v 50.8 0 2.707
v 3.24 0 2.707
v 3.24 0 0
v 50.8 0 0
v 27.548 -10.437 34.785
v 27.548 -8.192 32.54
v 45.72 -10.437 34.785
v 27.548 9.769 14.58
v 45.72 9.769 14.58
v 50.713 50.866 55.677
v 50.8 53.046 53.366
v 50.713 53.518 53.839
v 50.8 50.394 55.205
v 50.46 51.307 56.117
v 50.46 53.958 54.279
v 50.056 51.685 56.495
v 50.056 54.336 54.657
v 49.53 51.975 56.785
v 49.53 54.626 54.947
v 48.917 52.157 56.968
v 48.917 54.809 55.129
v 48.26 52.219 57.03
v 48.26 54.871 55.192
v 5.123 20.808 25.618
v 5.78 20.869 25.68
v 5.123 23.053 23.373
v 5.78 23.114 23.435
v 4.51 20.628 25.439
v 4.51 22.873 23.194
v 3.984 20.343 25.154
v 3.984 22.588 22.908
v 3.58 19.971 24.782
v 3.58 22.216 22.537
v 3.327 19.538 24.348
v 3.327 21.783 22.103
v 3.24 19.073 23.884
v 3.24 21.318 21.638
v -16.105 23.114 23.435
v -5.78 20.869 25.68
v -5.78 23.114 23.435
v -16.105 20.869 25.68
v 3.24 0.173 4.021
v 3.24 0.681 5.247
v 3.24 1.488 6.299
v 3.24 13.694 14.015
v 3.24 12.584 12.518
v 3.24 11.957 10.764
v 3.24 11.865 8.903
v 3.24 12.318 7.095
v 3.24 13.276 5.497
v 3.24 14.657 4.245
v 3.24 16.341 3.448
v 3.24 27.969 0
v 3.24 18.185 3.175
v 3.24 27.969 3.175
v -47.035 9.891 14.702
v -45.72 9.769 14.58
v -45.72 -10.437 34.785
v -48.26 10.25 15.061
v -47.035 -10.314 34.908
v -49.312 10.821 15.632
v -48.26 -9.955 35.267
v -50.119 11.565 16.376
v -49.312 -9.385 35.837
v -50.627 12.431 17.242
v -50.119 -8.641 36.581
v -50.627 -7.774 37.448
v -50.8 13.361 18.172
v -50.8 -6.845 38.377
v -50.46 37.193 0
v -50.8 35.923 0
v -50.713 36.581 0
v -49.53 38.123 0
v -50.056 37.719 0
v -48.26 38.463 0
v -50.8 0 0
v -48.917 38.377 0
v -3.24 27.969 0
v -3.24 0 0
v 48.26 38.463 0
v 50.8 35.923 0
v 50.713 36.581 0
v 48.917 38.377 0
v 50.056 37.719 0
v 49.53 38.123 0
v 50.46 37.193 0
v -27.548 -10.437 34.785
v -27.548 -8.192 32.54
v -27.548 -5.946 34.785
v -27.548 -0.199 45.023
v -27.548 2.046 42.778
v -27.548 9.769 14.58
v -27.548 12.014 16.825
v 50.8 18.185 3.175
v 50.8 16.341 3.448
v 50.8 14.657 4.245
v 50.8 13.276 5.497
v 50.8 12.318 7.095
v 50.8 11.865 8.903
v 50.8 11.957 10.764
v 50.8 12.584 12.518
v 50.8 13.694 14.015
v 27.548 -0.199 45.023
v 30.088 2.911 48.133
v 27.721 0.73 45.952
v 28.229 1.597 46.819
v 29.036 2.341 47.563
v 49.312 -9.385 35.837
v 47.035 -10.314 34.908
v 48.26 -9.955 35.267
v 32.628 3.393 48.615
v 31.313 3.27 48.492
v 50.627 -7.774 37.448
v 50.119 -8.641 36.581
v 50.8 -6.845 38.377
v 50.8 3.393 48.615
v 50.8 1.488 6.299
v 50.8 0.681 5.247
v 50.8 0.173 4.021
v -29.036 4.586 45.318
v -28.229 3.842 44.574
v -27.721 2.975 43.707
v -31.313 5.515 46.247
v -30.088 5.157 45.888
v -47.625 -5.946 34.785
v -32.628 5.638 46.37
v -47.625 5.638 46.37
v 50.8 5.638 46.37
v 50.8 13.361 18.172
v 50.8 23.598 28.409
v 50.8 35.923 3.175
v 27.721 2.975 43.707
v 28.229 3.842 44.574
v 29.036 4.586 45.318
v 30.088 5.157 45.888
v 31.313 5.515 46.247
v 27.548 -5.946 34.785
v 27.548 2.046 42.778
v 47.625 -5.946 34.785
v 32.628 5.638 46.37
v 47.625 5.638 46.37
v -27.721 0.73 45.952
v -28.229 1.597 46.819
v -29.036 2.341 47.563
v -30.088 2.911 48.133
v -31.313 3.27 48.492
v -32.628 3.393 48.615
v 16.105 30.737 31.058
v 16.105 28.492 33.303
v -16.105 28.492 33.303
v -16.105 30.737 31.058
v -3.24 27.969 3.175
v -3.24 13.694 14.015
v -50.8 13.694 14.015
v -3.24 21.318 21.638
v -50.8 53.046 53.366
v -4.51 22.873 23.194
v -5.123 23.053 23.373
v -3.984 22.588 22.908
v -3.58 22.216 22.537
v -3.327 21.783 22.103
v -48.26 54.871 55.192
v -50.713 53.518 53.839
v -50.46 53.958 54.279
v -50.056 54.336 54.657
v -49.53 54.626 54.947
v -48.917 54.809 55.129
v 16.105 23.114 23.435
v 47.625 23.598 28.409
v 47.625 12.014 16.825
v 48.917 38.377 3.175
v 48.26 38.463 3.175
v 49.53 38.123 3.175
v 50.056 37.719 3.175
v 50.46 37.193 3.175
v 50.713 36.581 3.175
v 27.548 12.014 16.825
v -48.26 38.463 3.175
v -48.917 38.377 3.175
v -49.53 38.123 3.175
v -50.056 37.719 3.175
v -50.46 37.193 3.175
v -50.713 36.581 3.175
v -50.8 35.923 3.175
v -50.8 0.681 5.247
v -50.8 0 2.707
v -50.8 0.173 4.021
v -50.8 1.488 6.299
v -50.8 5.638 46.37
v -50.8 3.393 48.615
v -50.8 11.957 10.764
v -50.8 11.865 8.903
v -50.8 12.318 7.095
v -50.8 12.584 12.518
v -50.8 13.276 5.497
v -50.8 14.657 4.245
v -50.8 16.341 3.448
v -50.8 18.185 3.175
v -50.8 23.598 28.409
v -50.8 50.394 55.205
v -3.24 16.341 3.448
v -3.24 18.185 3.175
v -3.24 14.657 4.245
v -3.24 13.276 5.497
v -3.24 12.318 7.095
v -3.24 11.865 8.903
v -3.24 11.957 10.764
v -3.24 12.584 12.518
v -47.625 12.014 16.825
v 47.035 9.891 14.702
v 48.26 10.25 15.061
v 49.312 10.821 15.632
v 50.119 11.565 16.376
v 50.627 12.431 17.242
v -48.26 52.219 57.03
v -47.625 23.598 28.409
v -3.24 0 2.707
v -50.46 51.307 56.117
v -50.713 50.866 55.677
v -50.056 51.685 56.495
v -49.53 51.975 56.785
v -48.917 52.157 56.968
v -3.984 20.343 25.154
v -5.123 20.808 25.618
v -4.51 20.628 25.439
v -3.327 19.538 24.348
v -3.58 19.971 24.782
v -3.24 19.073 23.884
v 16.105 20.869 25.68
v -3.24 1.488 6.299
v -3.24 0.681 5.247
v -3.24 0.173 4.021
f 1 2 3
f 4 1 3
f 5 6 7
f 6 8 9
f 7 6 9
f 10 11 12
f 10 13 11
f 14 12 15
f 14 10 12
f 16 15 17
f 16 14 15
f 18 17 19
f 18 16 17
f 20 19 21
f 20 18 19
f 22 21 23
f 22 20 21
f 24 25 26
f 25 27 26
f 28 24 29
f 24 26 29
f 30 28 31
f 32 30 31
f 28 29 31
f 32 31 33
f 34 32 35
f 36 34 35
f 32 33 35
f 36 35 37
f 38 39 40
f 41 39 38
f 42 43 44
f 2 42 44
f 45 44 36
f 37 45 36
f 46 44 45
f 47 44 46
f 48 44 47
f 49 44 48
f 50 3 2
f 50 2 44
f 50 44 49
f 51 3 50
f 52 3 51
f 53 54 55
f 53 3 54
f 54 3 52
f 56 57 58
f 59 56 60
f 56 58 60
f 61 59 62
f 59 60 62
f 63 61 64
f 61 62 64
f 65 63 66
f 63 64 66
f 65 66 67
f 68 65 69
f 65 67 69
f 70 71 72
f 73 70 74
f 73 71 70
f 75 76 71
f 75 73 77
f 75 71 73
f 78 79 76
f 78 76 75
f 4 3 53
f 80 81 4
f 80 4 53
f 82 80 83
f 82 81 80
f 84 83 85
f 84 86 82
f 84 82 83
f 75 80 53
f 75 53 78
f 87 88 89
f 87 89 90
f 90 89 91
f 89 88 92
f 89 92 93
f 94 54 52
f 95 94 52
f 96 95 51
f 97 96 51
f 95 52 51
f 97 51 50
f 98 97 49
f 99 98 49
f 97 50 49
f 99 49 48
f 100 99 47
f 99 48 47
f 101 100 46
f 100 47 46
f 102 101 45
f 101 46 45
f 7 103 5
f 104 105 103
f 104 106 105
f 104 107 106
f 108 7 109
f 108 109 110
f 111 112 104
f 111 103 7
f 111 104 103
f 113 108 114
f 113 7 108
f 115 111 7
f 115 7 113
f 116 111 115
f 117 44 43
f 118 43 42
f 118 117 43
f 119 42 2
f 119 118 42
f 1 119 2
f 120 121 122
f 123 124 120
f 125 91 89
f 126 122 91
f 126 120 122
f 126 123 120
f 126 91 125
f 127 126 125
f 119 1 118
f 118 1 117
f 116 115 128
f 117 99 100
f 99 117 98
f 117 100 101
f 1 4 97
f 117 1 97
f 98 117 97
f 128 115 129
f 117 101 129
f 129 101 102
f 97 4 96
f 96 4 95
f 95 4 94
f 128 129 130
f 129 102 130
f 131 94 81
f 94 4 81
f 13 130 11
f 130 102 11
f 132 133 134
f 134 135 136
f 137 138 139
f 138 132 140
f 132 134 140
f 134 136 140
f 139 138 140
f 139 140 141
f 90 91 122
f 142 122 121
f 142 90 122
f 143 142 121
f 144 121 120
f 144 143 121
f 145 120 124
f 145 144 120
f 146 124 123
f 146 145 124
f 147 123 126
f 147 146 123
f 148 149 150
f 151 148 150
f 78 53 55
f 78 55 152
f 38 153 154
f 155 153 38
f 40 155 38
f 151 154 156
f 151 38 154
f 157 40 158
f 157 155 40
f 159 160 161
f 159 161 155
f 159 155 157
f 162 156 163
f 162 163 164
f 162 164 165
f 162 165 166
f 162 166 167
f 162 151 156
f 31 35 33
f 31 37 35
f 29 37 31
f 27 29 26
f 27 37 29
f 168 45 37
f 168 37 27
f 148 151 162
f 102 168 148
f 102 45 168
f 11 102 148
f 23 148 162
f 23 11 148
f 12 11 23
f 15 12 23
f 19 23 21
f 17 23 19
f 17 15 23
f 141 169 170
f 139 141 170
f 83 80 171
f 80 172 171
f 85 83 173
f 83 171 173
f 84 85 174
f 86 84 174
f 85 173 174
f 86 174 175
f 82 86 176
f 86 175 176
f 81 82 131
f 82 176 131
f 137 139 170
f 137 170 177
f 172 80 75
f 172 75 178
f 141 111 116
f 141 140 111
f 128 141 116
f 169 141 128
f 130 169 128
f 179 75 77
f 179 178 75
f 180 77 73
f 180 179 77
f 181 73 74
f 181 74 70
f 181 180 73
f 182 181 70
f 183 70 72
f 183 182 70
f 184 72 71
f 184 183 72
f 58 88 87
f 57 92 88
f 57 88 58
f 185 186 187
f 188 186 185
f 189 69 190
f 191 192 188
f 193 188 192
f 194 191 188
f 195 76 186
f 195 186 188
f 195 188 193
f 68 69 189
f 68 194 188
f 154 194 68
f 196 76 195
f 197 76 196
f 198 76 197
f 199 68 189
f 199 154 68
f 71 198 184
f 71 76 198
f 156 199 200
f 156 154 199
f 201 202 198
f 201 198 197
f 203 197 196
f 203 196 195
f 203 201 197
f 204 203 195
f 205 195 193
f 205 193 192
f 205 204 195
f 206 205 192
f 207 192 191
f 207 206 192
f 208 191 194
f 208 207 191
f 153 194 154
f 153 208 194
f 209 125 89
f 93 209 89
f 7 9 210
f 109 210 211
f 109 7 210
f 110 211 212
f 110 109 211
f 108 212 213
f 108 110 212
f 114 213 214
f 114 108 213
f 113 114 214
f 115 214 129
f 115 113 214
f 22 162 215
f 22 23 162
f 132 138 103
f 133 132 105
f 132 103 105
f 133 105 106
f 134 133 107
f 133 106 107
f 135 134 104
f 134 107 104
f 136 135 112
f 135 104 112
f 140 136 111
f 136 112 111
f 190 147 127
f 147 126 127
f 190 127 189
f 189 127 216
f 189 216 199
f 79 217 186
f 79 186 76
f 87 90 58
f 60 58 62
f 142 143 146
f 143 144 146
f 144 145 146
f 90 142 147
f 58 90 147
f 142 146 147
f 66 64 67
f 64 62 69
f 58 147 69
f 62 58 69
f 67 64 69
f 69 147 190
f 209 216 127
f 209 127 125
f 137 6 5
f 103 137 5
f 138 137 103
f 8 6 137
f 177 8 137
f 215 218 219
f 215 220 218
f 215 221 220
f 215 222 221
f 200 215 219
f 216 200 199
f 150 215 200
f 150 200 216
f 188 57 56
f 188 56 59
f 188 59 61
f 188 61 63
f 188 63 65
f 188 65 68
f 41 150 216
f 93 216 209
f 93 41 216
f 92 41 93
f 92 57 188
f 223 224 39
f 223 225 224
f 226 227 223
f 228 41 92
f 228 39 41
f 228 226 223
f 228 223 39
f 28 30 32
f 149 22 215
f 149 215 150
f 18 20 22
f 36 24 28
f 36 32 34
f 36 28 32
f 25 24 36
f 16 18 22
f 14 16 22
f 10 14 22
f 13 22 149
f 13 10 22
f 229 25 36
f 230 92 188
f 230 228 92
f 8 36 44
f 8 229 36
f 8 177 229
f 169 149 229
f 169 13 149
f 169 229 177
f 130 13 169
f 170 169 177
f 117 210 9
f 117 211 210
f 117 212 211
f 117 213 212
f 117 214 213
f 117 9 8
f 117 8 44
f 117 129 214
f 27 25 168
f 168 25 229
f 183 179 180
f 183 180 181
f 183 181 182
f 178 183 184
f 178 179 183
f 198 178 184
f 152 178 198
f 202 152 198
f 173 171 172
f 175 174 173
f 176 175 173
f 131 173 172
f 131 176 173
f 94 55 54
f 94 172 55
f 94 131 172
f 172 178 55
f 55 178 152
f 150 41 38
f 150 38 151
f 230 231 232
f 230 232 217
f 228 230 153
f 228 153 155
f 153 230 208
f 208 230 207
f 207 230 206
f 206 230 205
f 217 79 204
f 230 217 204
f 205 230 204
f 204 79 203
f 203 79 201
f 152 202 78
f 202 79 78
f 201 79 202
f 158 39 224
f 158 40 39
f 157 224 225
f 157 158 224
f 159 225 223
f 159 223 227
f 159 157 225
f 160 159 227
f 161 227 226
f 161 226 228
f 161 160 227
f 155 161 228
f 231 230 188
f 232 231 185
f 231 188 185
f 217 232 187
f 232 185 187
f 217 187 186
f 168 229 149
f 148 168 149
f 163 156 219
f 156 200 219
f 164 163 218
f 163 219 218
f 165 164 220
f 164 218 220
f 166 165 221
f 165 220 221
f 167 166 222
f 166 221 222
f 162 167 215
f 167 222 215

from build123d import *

# Parameters (mm, degrees)
F1_DEPTH = 50.8
F3_DEPTH = 25.4
F4_W     = 16.1045007408
F4_H     = 10.7811614871
F5_DEPTH = 3.175
F6_W     = 3.2399867196
F6_H     = 27.9691088945
F7_REACH = 85.1871733106
F8_W     = 23.2520068914
F8_H     = 19.5576284379
F9_DEPTH = 3.175
F10_R    = 5.08
F11_R    = 2.54


with BuildPart() as f1:
    # F0 (on Right) → F1 (new body)
    with BuildSketch(Plane.YZ):
        with BuildLine():
            Line((0, 0), (38.4632237256, 0))
            Line((38.4632237256, 0), (38.4632237256, 3.175))
            Line((38.4632237256, 3.175), (18.1845425574, 3.175))
            ThreePointArc((18.1845425574, 3.175), (12.3179075259, 7.0949602045), (13.6944144968, 14.0151280605))
            Line((13.6944144968, 14.0151280605), (54.8708899793, 55.191603543))
            Line((54.8708899793, 55.191603543), (52.2191855315, 57.0300271557))
            Line((52.2191855315, 57.0300271557), (0, 4.8108416242))
            Line((0, 4.8108416242), (0, 0))
        make_face()
    extrude(amount=F1_DEPTH)

    # F2 (on face) → F3 (join)
    with BuildSketch(Plane(origin=(0, -2.4054208121, 2.4054208121), x_dir=(1, 0, 0), z_dir=(0, -0.7071067812, 0.7071067812))):
        Polygon((27.5479931086, 17.2171894163), (50.8, 17.2171894163), (50.8, 36.7748178542), (47.625, 36.7748178542), (47.625, 20.3921894163), (27.5479931086, 20.3921894163), align=None)
    extrude(amount=F3_DEPTH)

    # F4 (on face) → F5 (cut, through all)
    with BuildSketch(Plane(origin=(0, -2.4054208121, 2.4054208121), x_dir=(1, 0, 0), z_dir=(0, -0.7071067812, 0.7071067812))):
        with Locations((8.0522503704, 38.3052378893)):
            Rectangle(F4_W, F4_H)
    extrude(amount=-F5_DEPTH, mode=Mode.SUBTRACT)

    f7_end = Plane(origin=(8.0522503704, 21.9912884712, 24.5570660652), x_dir=(0, 0.7071067812, -0.7071067812), z_dir=(0, 0.7071067812, 0.7071067812))
    # F6 (on Top) → F7 (cut, up to a plane its end follows)
    with BuildSketch(Plane.XY):
        with Locations((1.6199933598, 13.9845544472)):
            Rectangle(F6_W, F6_H)
    f7_long = extrude(amount=F7_REACH, mode=Mode.PRIVATE)
    add(split(f7_long, bisect_by=f7_end, keep=Keep.BOTTOM, mode=Mode.PRIVATE), mode=Mode.SUBTRACT)

    # F8 (on face) → F9 (join)
    with BuildSketch(Plane(origin=(0, -20.3659330543, 20.3659330543), x_dir=(1, 0, 0), z_dir=(0, -0.7071067812, 0.7071067812))):
        with Locations((39.1739965543, 26.9960036352)):
            Rectangle(F8_W, F8_H)
    extrude(amount=F9_DEPTH)

    # F10
    f10_edges = [f1.edges().sort_by_distance(p)[0] for p in [
        (27.019993, 0, 4.810842),
        (50.8, -0.333818, 24.6826),
        (27.547993, 4.515258, 47.492188),
    ]]
    fillet(f10_edges, radius=F10_R)

    # F11
    f11_edges = [f1.edges().sort_by_distance(p)[0] for p in [
        (50.8, 53.545038, 56.110815),
        (50.8, 38.463224, 1.5875),
        (3.239987, 21.991288, 24.557066),
    ]]
    fillet(f11_edges, radius=F11_R)

    # F12: F1 across plane


with BuildPart() as f1_1:
    add(f1.part)
    add(f1.part.mirror(Plane.YZ))


solid = f1_1.part
